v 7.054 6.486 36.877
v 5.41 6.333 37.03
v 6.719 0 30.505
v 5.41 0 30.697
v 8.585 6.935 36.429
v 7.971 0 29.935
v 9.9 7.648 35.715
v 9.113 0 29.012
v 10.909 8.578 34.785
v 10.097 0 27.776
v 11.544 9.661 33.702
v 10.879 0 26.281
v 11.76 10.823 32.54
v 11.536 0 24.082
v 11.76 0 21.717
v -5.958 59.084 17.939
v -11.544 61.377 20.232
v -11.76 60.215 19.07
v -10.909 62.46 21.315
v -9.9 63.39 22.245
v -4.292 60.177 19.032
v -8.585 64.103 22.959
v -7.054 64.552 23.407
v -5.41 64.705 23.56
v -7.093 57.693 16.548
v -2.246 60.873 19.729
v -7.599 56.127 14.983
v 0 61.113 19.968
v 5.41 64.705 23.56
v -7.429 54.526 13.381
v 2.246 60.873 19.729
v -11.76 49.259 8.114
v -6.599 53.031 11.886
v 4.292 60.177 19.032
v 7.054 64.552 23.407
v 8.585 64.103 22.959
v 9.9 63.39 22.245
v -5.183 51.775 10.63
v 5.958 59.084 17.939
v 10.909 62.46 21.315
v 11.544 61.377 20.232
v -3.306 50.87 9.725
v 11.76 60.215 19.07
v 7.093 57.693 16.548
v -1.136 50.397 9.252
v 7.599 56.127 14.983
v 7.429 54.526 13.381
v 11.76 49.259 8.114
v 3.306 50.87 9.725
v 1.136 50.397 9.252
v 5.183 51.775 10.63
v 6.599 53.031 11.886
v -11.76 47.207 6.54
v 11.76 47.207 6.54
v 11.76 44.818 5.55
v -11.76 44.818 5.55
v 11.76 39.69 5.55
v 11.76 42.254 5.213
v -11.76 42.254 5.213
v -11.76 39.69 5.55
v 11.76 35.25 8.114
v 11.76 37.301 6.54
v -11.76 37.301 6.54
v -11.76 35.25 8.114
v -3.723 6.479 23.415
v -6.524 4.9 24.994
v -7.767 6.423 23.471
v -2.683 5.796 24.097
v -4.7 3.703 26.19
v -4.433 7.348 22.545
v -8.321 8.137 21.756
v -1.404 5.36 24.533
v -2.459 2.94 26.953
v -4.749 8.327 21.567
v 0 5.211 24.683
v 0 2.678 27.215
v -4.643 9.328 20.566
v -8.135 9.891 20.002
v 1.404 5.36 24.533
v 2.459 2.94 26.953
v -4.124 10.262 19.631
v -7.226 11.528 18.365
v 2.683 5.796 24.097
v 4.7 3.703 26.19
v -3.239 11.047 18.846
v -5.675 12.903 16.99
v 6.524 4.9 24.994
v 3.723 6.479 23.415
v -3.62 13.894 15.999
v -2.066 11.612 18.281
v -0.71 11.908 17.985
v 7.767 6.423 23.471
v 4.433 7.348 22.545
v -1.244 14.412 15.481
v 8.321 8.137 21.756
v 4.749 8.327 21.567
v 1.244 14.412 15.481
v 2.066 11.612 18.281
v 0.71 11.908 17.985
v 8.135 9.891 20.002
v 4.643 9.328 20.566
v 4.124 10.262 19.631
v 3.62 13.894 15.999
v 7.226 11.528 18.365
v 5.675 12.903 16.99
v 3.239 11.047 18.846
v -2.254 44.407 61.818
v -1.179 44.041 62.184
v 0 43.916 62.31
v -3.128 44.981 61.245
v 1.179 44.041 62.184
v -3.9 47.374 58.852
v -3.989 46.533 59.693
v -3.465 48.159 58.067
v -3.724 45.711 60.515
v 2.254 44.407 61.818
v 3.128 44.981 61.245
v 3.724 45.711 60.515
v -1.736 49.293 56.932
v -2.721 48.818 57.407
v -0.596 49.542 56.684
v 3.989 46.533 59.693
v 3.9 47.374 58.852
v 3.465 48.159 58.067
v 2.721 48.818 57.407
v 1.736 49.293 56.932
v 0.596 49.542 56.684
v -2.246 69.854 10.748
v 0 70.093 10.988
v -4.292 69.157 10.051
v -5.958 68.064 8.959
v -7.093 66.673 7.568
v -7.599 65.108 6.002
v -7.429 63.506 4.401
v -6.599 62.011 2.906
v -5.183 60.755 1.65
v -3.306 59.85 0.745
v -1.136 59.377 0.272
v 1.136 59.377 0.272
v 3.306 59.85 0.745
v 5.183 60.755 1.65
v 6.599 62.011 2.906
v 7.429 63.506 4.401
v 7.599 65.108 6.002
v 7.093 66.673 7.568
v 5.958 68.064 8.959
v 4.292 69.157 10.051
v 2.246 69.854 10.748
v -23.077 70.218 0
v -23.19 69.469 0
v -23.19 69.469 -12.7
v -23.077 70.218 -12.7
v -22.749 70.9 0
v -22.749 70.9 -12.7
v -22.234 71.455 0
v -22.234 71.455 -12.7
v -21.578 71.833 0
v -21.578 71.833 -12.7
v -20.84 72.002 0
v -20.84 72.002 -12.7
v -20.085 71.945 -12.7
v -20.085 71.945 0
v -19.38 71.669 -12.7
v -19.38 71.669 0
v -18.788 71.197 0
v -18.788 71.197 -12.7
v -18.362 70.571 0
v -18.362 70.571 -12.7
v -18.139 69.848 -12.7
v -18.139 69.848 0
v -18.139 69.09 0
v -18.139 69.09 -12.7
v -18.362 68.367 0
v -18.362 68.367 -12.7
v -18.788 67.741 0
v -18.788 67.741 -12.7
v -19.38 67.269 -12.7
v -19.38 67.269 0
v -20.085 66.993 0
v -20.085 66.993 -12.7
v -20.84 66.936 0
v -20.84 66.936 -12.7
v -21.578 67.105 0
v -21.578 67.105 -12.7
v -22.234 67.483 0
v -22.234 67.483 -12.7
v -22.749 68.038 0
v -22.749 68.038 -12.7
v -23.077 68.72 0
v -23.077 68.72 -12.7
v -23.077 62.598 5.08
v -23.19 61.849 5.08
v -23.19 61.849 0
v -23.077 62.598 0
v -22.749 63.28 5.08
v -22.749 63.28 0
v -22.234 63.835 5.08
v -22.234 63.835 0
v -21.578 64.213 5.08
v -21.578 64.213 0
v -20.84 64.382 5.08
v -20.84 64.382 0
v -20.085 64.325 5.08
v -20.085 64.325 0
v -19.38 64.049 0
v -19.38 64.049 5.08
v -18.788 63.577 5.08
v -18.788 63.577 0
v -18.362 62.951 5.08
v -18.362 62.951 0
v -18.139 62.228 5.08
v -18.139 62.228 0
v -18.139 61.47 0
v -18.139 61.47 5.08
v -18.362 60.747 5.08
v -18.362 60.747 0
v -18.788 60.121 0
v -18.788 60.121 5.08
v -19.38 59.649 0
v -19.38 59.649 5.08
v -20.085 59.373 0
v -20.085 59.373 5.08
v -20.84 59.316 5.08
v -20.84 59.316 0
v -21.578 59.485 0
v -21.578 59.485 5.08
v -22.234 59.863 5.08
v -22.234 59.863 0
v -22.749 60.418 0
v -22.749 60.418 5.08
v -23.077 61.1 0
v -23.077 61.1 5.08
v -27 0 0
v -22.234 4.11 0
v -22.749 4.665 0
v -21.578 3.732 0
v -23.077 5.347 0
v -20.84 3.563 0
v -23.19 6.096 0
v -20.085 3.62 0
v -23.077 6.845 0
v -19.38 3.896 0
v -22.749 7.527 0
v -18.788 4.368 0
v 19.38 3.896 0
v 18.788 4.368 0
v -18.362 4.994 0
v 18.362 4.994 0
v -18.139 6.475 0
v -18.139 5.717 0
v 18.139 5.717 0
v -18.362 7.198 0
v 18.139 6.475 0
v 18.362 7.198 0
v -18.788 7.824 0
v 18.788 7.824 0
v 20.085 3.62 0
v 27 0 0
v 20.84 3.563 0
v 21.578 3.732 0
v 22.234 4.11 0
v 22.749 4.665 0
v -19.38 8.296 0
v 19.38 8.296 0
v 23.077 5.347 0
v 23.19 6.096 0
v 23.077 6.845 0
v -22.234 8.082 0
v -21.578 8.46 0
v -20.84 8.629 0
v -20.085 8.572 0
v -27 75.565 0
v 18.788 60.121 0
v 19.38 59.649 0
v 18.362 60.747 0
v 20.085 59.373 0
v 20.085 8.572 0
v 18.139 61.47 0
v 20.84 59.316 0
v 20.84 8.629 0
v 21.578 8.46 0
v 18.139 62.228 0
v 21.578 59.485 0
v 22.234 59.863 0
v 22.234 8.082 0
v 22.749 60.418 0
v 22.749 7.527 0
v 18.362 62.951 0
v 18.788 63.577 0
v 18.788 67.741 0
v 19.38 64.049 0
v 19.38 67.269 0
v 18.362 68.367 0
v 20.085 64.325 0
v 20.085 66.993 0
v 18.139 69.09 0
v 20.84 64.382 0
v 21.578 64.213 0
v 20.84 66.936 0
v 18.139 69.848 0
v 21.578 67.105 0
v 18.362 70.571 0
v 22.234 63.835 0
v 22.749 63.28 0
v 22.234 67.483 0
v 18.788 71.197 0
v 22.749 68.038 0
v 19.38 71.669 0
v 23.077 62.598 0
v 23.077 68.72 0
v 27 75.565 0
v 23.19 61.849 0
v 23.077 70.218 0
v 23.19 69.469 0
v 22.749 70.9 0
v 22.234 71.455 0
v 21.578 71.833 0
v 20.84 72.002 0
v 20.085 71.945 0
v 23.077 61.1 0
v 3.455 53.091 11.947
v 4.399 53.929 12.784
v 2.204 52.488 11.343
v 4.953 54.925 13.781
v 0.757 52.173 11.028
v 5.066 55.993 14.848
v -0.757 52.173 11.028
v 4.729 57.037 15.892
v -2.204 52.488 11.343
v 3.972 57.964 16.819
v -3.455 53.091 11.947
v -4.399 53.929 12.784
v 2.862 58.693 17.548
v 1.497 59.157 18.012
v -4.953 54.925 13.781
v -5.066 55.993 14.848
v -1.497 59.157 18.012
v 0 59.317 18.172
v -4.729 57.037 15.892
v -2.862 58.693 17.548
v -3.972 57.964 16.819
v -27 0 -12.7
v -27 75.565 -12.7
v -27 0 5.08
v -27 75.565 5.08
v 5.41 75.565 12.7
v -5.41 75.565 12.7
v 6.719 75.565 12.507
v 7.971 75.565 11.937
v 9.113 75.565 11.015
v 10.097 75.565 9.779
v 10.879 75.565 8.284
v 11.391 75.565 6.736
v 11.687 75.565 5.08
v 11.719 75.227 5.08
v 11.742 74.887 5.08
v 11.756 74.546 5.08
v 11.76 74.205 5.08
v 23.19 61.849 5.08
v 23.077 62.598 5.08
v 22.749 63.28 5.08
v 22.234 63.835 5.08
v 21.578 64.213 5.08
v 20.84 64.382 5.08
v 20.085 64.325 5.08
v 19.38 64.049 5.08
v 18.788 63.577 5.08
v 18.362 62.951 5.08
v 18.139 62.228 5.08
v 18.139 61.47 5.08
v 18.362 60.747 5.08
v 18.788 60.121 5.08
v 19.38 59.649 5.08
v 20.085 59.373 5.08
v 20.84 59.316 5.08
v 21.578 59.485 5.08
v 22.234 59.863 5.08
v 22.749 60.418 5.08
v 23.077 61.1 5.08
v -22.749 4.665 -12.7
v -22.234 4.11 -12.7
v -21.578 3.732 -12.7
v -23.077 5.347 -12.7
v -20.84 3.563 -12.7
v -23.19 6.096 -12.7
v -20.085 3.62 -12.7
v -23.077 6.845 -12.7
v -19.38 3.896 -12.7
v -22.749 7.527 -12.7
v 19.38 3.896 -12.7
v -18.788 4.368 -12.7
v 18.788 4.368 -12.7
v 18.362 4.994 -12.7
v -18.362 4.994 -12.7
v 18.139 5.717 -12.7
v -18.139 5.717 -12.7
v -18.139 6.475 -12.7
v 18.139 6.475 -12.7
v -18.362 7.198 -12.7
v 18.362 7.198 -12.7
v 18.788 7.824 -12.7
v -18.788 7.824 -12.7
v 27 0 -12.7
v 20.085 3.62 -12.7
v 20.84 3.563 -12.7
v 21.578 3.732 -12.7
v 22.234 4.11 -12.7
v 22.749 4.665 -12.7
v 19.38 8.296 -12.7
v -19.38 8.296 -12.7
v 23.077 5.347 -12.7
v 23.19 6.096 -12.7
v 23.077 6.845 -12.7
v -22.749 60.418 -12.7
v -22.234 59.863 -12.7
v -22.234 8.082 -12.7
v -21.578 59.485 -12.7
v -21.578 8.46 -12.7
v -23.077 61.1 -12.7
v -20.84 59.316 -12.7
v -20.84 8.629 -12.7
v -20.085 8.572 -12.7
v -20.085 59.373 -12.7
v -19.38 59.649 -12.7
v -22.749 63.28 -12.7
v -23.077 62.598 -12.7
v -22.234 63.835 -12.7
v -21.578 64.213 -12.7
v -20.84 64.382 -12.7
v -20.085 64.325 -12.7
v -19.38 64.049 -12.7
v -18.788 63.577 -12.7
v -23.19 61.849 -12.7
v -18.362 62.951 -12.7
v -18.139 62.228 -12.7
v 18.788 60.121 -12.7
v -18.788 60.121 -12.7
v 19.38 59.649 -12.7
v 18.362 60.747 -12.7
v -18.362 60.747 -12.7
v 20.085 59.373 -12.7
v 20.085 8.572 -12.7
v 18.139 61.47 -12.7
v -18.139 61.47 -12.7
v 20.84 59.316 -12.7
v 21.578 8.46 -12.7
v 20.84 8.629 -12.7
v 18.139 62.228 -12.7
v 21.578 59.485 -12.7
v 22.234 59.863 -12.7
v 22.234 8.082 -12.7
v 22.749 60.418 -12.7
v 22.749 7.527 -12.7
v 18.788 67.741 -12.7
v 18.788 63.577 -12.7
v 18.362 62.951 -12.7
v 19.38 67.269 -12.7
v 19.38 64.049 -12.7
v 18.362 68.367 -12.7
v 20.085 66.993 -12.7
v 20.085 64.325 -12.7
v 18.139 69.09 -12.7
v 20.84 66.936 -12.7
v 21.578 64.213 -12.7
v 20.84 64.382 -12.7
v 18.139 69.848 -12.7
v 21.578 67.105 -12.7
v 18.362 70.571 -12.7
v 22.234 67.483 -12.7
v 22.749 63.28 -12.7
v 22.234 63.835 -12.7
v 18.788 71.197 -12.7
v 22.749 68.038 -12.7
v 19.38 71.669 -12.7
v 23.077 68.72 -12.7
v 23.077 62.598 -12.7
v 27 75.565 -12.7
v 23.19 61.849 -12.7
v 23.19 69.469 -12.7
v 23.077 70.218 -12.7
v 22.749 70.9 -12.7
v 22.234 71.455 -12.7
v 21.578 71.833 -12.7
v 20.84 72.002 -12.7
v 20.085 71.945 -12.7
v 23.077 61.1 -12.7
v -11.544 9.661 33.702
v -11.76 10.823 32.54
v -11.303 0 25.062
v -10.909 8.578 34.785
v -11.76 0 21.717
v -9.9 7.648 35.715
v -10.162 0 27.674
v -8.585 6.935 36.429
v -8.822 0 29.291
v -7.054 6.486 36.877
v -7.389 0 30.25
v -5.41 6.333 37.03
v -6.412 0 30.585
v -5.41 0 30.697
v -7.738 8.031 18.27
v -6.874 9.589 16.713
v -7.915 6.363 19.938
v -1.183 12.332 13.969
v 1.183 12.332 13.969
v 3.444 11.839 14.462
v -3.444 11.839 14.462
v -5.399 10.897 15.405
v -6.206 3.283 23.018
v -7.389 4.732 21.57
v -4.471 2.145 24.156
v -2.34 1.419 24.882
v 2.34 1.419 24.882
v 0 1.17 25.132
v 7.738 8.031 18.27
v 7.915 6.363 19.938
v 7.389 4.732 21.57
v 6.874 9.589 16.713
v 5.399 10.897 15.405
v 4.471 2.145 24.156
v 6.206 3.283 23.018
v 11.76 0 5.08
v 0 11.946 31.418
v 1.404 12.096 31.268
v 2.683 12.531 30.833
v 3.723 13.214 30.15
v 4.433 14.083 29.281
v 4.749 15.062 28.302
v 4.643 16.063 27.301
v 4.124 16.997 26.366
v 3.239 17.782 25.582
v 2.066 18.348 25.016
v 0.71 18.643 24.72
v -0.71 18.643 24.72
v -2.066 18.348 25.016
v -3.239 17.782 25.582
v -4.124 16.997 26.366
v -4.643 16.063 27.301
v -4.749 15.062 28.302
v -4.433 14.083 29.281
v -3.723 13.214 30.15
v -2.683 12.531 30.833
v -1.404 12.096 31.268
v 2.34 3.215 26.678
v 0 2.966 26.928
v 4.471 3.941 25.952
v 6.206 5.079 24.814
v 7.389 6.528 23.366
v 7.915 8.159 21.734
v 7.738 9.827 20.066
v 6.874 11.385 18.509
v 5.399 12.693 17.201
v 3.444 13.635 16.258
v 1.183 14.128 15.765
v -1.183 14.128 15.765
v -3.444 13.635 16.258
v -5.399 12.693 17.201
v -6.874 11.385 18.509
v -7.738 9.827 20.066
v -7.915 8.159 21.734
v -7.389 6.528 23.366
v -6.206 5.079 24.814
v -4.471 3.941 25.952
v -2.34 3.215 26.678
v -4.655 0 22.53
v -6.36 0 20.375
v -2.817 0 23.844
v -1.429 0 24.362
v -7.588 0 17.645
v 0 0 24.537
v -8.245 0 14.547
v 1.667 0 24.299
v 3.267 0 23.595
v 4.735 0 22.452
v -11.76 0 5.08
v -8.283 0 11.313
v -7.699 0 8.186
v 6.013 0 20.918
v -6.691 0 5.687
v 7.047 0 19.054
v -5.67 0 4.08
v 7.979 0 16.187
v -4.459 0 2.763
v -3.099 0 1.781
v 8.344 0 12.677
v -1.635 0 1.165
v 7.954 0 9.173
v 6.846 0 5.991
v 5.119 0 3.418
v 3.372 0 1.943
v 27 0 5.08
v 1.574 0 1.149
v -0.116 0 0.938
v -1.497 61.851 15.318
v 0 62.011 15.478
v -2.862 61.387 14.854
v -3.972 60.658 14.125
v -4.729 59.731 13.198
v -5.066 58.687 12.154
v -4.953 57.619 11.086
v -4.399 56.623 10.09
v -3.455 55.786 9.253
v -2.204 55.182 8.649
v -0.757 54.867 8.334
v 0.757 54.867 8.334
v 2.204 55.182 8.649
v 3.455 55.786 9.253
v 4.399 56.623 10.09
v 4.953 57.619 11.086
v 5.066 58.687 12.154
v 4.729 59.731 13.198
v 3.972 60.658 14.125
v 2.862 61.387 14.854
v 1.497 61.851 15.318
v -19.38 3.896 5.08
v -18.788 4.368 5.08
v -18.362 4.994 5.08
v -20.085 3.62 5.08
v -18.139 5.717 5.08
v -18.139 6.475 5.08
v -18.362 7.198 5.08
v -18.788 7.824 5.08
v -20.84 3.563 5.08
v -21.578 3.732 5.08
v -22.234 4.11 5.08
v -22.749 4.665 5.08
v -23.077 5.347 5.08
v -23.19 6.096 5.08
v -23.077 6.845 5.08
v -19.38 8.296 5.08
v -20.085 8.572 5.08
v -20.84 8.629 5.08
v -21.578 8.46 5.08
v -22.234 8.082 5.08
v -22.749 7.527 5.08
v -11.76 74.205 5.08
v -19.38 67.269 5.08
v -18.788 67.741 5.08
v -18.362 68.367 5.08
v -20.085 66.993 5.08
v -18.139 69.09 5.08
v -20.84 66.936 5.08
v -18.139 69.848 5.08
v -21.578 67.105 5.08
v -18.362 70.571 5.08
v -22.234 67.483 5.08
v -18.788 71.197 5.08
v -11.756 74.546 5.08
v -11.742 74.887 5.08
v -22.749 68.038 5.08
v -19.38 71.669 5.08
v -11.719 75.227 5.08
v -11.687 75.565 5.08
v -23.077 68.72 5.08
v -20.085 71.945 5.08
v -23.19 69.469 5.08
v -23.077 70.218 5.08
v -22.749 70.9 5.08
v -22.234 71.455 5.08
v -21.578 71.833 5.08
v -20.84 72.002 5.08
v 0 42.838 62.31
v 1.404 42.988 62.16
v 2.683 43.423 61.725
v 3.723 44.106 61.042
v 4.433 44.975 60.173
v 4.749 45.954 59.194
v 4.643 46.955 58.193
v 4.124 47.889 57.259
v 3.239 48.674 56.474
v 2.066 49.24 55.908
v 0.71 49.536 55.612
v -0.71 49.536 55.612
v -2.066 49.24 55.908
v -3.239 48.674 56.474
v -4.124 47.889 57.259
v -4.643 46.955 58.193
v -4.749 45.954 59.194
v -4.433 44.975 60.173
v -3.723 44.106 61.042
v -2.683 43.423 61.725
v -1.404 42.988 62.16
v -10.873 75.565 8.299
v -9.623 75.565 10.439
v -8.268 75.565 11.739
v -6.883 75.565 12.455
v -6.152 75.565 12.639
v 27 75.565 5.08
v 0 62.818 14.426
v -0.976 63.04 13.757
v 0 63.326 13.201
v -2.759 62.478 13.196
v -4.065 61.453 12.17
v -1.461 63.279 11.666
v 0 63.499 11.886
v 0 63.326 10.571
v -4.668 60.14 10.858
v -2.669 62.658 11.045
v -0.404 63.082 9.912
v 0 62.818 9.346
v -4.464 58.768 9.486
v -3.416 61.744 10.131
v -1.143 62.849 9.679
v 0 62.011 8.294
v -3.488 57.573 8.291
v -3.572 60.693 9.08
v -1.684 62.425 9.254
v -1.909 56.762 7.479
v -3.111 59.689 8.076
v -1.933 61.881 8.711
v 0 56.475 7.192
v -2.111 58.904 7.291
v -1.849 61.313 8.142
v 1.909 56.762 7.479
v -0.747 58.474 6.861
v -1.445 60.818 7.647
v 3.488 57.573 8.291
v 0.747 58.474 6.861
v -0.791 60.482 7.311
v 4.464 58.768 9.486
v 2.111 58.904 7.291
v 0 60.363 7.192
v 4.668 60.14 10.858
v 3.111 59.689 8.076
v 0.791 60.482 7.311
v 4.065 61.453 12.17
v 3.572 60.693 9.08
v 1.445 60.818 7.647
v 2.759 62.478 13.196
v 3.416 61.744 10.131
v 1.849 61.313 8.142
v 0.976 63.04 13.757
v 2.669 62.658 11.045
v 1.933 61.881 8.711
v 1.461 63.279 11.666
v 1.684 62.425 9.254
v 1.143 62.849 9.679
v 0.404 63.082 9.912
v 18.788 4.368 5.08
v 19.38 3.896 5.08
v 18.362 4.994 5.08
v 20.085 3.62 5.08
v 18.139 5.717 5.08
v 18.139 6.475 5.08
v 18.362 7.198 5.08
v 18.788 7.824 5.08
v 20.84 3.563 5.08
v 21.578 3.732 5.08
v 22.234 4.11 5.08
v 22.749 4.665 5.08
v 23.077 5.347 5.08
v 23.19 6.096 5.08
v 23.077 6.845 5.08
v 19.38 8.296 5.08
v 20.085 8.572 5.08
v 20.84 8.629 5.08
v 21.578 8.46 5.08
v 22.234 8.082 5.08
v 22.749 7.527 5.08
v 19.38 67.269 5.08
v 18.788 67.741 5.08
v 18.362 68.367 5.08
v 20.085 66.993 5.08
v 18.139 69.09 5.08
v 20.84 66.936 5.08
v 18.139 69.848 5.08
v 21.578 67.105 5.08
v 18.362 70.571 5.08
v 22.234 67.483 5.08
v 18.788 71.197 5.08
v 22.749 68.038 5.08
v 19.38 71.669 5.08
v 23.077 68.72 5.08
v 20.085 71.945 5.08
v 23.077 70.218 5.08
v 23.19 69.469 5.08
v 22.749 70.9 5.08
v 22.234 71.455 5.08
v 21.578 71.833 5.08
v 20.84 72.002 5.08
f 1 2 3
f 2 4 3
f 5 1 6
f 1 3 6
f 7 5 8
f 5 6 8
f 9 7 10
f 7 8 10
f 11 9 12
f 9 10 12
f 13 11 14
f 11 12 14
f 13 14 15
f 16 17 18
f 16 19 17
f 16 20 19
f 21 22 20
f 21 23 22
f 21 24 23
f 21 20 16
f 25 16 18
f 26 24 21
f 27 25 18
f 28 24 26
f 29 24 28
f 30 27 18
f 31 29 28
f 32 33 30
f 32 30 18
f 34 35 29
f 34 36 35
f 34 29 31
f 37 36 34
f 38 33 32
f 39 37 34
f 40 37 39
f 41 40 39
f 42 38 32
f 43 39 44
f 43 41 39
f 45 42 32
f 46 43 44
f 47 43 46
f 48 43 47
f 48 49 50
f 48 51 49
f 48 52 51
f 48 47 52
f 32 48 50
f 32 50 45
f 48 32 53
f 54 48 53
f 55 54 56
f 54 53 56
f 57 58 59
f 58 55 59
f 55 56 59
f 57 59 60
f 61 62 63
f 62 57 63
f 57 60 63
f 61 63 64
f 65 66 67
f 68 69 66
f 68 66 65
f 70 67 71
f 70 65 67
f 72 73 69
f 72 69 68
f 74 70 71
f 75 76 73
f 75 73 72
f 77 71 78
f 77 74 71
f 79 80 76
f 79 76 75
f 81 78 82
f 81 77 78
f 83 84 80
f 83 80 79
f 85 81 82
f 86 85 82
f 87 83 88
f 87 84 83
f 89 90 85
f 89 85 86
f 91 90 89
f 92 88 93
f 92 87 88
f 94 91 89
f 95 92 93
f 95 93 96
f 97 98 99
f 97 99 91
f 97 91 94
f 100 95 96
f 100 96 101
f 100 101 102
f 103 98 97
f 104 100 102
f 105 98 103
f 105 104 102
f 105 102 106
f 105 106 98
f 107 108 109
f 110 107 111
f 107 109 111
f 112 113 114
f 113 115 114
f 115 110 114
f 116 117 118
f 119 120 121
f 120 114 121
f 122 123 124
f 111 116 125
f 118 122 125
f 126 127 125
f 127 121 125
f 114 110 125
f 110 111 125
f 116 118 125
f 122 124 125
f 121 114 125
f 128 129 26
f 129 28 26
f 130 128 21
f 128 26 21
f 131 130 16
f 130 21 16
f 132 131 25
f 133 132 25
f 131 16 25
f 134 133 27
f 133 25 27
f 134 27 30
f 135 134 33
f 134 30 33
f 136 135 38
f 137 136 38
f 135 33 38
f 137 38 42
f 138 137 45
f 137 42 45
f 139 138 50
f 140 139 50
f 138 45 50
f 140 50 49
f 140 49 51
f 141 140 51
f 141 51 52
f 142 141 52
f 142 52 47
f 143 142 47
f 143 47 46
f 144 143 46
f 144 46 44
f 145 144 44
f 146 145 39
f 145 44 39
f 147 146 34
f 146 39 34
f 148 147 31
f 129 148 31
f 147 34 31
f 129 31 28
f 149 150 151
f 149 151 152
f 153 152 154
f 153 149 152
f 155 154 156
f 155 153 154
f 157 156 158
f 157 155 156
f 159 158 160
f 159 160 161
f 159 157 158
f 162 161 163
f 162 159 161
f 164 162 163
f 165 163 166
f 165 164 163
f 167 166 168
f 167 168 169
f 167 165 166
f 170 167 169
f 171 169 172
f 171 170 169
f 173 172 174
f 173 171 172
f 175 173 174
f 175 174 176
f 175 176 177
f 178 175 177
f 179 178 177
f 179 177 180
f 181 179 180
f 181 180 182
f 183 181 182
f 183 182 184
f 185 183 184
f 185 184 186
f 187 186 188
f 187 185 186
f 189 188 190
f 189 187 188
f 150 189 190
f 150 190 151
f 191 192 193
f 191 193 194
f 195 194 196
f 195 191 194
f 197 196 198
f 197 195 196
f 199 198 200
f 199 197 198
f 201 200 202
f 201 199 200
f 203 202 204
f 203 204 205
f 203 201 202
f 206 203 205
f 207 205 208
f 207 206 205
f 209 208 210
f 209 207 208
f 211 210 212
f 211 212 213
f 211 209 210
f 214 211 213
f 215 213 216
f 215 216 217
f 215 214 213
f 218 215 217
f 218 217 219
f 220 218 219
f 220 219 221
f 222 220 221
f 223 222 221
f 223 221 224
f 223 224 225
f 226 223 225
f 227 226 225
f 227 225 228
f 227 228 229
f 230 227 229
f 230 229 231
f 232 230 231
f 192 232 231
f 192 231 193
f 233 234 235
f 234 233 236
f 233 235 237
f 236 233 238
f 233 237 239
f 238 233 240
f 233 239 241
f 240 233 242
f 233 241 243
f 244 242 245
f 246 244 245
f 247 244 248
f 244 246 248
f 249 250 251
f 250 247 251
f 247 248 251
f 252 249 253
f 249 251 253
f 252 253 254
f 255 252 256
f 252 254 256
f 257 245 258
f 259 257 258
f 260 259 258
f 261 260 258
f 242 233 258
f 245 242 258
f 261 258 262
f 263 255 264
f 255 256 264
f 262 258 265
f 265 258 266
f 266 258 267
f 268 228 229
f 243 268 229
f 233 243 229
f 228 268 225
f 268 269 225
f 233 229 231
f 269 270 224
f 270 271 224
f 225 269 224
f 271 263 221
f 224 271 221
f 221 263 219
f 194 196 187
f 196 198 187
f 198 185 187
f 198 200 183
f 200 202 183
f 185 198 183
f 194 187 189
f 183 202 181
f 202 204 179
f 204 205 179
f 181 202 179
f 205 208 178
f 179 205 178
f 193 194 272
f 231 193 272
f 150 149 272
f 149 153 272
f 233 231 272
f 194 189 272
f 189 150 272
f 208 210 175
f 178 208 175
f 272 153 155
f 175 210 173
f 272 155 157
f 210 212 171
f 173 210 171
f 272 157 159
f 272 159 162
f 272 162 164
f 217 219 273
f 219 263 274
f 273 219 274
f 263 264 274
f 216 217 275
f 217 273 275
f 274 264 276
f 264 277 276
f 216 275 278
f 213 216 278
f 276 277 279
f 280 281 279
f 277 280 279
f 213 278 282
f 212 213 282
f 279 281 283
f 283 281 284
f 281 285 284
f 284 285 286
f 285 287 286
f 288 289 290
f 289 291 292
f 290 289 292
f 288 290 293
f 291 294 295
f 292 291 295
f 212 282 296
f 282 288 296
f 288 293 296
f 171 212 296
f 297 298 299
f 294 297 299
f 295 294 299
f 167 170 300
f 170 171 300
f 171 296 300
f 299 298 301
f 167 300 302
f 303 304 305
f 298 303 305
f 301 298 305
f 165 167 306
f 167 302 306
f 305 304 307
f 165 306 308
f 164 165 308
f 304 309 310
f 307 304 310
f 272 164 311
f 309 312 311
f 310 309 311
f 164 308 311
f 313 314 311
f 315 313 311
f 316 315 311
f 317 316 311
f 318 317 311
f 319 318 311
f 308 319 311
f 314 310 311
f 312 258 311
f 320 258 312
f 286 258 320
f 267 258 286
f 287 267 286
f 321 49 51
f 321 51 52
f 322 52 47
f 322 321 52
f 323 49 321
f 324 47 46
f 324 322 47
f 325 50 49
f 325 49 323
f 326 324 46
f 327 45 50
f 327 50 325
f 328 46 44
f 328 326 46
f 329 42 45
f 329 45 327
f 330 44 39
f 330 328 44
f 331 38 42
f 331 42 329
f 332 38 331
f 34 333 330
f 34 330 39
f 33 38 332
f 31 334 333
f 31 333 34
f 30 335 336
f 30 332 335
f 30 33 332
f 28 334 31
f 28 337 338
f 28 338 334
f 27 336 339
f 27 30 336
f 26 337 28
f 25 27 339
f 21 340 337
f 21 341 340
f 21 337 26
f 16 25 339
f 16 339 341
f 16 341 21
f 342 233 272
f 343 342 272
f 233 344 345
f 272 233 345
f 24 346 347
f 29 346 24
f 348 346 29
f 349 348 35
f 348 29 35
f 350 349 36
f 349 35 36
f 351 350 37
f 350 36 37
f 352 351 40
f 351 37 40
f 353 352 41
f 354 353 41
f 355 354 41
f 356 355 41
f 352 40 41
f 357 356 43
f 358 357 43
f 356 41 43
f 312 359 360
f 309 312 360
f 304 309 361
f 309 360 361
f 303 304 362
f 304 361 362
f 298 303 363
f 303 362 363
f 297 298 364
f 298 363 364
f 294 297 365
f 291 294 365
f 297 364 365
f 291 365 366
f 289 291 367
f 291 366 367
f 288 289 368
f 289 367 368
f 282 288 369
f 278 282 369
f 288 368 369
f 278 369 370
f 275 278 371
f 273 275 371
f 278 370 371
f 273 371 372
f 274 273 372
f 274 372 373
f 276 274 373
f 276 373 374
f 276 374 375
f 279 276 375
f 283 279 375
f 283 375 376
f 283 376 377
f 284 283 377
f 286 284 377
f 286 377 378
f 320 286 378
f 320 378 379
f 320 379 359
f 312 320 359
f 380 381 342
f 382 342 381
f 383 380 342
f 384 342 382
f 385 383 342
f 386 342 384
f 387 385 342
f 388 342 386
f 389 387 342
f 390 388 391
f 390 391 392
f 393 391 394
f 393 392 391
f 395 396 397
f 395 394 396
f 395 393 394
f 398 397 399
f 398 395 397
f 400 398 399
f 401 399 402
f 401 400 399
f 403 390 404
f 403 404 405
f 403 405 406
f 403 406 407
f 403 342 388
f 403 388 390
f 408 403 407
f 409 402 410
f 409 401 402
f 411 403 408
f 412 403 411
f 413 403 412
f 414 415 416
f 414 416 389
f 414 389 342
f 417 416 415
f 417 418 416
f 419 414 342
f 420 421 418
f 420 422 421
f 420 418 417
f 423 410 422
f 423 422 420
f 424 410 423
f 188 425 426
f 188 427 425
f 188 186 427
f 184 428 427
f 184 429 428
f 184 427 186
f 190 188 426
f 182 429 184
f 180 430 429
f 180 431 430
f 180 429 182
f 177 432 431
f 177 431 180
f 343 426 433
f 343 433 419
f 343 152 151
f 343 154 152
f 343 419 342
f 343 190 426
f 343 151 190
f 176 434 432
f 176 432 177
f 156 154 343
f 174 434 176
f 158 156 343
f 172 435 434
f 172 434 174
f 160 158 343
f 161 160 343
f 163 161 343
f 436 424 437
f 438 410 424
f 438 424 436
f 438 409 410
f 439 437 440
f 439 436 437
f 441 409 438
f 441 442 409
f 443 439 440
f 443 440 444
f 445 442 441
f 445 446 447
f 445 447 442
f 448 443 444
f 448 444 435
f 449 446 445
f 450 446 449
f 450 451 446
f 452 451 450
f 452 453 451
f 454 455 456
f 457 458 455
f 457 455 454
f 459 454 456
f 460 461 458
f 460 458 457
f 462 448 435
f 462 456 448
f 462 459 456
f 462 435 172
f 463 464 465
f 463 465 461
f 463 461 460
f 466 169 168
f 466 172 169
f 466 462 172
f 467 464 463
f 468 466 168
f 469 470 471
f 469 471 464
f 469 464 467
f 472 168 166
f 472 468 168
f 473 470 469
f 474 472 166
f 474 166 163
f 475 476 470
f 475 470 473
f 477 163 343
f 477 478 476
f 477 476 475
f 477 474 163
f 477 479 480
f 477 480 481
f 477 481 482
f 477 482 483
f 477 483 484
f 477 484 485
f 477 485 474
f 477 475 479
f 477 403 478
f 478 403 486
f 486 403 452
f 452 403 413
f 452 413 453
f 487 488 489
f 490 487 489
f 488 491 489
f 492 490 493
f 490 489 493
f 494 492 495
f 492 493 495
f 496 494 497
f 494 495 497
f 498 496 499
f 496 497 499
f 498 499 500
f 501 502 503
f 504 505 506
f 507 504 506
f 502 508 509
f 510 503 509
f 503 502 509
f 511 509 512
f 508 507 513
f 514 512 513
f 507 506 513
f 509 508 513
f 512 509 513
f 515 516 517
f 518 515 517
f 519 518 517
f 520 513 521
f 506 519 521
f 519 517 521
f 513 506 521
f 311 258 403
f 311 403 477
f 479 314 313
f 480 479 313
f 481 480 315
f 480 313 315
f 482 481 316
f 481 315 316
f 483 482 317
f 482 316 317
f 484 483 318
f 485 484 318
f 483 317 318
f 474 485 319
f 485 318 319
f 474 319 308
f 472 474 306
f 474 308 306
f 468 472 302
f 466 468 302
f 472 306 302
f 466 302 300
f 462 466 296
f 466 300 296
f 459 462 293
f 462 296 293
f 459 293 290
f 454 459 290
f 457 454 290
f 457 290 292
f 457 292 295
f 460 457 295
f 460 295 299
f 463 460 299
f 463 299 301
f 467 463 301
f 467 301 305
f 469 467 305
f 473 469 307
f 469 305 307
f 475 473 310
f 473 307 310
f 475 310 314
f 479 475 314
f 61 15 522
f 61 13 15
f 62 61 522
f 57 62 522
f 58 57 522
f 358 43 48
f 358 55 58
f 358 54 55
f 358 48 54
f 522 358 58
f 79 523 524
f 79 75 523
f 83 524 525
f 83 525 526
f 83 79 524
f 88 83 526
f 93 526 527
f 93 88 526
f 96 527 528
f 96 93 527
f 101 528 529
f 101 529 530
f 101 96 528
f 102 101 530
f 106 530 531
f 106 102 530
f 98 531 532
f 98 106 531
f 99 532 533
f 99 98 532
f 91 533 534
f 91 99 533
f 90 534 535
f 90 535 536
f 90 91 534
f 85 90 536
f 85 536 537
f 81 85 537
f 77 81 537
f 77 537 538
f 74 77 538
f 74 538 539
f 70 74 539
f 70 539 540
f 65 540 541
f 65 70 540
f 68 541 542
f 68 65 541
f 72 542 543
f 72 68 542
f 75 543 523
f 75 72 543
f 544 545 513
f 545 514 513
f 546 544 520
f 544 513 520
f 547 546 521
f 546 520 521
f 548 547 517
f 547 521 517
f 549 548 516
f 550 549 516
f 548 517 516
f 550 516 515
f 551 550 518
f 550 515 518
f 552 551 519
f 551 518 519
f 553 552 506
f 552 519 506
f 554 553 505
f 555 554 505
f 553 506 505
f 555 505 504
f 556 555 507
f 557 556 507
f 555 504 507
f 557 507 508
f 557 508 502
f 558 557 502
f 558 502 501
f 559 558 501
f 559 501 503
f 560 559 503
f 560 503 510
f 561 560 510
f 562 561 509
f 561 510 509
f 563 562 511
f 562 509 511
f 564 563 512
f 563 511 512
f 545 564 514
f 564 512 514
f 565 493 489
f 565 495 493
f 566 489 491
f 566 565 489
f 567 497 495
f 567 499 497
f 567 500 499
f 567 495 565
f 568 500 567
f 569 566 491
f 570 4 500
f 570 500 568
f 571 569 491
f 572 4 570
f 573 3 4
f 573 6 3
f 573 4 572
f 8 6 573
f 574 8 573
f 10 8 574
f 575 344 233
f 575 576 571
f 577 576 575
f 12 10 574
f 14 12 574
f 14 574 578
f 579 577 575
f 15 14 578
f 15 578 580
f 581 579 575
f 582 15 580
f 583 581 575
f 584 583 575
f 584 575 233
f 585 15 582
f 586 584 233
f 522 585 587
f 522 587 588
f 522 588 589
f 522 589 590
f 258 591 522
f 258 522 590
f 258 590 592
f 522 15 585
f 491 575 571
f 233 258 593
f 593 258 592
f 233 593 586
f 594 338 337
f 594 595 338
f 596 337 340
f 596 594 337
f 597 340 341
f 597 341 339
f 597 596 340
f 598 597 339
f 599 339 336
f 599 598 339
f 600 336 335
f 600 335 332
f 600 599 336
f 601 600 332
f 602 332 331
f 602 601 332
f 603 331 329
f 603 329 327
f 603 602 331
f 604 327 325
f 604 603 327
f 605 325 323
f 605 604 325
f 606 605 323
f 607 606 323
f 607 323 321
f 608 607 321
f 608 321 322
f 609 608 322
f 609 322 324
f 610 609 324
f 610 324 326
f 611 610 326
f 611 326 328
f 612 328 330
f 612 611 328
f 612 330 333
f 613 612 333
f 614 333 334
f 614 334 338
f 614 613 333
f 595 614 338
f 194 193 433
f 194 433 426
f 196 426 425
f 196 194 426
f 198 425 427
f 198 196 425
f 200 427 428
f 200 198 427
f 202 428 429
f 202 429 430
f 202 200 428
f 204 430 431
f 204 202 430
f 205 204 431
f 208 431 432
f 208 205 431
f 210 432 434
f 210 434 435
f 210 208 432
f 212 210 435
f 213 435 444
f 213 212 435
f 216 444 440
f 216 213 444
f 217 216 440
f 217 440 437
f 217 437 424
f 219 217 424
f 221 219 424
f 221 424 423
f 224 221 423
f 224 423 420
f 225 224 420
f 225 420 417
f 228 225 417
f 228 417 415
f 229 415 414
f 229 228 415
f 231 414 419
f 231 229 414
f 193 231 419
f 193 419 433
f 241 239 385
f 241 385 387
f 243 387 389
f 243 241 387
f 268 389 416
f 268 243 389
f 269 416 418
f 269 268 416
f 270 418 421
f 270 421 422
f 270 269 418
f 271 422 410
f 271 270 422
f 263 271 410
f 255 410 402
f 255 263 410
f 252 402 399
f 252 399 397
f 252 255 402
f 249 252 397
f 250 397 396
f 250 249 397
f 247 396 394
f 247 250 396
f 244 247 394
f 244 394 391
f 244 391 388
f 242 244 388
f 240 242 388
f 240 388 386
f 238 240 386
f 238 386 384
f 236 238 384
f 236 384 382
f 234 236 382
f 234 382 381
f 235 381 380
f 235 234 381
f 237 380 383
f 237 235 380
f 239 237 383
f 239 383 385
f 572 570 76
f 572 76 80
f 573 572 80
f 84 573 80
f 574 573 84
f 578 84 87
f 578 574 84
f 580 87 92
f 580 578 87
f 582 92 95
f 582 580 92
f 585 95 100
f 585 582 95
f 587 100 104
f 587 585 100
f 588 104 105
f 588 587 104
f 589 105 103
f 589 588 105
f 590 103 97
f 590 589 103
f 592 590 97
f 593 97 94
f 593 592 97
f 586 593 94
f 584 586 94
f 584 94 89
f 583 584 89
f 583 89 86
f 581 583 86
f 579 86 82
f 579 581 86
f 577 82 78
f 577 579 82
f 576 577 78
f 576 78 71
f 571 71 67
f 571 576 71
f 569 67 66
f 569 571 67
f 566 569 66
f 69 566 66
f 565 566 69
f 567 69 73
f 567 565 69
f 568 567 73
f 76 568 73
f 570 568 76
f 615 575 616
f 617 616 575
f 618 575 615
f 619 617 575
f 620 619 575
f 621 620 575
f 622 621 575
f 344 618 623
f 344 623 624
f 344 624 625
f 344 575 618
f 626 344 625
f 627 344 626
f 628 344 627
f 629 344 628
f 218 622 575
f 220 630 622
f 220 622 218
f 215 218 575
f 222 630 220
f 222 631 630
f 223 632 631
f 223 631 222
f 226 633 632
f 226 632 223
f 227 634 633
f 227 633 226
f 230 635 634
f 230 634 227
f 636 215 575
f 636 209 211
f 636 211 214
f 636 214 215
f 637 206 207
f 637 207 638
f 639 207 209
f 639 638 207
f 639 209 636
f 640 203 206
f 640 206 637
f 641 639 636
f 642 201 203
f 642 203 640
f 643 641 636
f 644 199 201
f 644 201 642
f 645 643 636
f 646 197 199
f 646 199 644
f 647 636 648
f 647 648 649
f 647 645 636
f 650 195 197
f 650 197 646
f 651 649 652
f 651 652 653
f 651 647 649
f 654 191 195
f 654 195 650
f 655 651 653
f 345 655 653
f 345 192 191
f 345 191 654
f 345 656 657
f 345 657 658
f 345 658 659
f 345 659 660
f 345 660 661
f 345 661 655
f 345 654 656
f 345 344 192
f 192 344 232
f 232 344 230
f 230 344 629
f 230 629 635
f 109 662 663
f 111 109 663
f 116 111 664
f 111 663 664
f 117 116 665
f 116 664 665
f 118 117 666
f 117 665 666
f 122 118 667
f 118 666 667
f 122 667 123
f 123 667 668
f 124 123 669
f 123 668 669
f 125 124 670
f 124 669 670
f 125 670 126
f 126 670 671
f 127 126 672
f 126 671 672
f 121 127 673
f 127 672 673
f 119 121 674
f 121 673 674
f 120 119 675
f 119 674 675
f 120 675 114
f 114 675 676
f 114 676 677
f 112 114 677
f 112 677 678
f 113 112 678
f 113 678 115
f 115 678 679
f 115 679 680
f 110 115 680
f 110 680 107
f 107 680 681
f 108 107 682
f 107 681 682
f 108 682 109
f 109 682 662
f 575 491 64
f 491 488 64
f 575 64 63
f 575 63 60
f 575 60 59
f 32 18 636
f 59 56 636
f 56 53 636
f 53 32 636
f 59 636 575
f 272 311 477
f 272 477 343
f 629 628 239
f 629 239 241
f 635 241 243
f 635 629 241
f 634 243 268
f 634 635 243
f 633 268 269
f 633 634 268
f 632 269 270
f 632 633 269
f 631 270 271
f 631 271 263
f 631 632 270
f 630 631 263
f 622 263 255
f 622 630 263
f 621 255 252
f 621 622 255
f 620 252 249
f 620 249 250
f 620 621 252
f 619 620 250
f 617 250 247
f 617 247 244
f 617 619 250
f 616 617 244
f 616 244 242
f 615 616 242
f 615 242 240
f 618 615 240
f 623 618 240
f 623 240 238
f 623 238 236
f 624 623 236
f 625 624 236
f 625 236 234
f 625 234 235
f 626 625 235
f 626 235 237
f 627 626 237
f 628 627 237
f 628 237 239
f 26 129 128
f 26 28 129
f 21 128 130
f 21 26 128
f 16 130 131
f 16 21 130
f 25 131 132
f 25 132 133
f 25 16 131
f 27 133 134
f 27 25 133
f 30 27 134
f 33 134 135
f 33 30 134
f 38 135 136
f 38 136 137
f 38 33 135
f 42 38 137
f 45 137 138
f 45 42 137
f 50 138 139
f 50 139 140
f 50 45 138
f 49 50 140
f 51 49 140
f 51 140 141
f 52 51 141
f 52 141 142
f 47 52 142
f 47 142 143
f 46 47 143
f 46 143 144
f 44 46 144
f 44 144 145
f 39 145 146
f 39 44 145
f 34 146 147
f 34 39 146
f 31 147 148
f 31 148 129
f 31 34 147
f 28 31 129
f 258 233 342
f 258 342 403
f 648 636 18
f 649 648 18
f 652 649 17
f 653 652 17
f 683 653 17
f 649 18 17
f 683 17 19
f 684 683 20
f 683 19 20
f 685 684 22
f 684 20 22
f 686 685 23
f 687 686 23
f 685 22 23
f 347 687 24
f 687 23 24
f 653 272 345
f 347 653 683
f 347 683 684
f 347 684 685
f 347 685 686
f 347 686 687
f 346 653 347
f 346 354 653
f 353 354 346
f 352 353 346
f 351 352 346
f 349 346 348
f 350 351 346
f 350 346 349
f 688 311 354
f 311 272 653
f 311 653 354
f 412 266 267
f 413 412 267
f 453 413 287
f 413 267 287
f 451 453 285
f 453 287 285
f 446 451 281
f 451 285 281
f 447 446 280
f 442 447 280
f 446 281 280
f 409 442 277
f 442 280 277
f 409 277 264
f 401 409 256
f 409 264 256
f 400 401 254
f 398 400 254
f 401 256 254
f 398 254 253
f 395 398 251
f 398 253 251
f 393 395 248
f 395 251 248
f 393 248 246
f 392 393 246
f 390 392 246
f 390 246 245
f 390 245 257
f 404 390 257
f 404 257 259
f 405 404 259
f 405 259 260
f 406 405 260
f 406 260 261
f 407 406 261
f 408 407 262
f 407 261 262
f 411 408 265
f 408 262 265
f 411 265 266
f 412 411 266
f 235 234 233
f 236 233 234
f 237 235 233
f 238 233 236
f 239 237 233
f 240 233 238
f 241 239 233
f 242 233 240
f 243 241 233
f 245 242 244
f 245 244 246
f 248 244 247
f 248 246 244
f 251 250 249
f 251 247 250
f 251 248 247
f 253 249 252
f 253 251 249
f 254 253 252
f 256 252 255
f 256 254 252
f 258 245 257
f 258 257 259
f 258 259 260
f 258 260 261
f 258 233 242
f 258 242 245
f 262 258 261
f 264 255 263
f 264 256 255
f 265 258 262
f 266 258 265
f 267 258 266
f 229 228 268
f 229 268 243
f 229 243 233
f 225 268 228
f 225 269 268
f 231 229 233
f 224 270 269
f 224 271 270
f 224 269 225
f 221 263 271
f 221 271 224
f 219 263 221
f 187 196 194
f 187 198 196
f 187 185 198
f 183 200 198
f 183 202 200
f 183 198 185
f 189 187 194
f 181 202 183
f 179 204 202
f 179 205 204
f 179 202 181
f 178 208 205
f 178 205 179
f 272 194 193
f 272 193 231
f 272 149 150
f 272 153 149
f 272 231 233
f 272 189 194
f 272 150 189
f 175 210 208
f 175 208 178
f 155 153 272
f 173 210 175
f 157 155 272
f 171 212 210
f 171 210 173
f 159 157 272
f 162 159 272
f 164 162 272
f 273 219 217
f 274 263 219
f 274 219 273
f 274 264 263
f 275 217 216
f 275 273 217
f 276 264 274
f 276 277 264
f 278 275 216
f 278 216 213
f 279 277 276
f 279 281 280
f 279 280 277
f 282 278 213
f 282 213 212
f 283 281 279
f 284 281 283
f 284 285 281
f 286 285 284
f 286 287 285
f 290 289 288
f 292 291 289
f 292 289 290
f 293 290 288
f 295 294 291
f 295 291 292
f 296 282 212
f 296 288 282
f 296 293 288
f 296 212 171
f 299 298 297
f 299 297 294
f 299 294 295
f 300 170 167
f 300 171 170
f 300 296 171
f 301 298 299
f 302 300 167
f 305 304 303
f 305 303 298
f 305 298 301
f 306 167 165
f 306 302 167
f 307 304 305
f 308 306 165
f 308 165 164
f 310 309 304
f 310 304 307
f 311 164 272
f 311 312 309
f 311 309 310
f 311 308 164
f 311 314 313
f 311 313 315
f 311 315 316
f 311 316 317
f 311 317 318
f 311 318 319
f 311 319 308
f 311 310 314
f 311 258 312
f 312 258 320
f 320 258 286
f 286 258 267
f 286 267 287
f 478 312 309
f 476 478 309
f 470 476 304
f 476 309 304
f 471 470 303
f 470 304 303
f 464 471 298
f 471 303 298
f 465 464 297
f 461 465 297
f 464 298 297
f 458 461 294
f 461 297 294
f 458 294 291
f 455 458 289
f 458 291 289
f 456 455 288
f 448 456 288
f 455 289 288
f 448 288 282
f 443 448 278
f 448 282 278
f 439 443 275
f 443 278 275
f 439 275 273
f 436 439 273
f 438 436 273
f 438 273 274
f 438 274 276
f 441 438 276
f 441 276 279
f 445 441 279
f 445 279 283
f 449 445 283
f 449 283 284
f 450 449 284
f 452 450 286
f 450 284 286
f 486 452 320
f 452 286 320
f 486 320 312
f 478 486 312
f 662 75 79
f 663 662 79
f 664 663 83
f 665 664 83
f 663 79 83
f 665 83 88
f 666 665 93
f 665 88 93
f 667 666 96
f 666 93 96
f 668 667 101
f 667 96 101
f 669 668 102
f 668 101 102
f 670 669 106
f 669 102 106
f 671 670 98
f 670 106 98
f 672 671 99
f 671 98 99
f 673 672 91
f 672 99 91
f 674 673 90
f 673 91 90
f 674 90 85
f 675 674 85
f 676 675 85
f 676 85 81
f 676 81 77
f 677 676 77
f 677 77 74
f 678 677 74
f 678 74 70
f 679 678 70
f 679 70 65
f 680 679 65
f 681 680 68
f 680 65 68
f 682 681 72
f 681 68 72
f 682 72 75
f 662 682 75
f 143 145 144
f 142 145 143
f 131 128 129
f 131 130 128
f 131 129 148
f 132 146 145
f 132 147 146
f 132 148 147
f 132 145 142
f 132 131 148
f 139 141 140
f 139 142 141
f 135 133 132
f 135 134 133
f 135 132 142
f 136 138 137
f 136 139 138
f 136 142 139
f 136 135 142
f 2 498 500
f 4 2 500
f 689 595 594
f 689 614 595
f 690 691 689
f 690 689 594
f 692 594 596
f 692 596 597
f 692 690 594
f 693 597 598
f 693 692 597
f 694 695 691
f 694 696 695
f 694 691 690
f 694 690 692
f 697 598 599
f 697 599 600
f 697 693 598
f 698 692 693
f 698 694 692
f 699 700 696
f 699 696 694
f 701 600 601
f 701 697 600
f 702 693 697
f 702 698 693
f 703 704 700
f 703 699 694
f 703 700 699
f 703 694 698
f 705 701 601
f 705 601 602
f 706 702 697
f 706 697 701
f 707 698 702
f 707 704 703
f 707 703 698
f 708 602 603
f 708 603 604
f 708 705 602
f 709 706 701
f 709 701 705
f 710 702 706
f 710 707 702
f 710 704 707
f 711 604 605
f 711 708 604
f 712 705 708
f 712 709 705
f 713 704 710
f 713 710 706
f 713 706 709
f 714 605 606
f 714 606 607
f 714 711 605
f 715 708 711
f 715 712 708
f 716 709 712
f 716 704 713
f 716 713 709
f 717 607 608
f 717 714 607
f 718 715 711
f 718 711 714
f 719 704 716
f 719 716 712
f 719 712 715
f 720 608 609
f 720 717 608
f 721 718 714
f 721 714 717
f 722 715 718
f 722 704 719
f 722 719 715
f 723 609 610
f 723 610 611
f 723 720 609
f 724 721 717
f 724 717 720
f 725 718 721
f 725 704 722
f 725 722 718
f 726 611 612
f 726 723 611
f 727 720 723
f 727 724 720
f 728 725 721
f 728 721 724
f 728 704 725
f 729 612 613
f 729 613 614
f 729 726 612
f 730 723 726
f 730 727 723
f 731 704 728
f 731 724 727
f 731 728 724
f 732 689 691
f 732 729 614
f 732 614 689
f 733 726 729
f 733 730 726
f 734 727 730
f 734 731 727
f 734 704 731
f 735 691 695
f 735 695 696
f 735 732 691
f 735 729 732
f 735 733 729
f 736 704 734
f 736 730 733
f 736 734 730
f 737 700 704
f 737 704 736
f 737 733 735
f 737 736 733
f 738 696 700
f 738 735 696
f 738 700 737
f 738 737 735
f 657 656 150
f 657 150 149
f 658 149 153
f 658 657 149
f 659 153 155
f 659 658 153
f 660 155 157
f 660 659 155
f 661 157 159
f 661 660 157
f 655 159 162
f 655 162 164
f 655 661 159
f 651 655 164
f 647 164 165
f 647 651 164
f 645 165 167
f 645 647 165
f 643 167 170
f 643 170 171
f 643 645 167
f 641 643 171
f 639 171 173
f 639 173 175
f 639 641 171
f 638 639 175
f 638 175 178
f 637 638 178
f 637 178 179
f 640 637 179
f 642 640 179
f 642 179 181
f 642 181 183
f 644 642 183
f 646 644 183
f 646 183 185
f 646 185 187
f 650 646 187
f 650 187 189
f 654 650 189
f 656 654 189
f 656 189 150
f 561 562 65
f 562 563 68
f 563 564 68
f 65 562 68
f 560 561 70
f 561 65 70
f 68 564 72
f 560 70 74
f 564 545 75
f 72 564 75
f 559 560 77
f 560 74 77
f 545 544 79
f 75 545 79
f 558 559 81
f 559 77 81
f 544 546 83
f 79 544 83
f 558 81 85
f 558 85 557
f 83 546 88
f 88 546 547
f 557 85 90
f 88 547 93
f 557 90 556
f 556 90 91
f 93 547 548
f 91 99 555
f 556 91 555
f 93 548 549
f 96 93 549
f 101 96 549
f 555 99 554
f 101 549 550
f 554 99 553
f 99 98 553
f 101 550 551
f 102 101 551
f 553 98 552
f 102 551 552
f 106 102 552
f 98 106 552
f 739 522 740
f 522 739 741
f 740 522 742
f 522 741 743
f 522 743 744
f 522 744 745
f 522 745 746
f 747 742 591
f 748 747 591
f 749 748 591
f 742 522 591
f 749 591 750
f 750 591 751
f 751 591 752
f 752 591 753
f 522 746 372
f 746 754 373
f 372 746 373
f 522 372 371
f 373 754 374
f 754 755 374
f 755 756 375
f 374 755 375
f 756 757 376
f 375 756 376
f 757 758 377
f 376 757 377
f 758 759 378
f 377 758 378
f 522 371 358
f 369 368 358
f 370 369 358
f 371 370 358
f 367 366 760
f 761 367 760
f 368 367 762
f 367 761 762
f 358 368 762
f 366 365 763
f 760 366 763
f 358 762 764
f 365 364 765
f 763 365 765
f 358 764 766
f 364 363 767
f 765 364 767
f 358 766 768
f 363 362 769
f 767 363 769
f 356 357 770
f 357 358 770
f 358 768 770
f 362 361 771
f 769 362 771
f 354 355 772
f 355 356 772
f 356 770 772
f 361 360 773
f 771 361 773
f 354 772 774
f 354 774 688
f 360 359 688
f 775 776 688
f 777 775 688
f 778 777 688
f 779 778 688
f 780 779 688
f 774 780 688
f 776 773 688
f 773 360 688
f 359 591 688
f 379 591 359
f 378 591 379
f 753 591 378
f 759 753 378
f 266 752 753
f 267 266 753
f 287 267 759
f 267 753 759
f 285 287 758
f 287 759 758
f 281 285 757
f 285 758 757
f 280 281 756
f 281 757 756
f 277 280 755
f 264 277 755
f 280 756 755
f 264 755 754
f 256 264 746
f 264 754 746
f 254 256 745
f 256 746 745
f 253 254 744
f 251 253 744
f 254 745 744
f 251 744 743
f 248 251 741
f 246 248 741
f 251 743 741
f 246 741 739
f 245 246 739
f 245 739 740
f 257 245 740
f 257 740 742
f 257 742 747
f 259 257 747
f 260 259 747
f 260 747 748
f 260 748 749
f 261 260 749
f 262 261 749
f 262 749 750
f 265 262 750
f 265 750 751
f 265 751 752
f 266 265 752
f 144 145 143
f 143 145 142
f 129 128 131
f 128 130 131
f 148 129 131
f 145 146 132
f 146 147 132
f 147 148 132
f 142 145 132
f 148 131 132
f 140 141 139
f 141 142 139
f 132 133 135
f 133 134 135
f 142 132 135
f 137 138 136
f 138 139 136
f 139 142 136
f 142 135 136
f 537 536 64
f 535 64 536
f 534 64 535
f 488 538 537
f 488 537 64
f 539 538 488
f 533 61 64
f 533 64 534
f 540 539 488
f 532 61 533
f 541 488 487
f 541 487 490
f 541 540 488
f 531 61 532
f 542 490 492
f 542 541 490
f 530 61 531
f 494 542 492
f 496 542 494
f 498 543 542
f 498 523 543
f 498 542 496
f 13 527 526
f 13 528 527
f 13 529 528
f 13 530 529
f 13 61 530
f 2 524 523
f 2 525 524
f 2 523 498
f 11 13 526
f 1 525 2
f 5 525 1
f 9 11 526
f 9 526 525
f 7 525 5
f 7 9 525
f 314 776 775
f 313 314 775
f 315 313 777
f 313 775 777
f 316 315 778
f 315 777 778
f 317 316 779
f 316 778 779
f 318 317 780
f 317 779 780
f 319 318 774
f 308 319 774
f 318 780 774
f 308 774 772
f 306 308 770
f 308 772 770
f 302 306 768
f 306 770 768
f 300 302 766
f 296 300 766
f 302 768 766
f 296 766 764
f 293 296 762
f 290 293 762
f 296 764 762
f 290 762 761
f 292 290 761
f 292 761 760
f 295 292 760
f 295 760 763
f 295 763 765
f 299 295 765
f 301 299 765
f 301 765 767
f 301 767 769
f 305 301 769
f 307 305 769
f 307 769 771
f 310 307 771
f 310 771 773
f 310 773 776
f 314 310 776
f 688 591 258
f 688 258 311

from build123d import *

# Parameters (mm, degrees)
F1_DEPTH  = 27.0002
F2_R      = 9.906
F3_W      = 75.565
F3_H      = 31.9504877579
F4_DEPTH  = 15.24
F5_R      = 2.54
F6_DEPTH  = 5.081
F8_R      = 6.35
F13_SIZE  = 0.762
F16_DEPTH = 12.7


with BuildPart() as f1:
    # F0 (on Right) → F1 (new body)
    with BuildSketch(Plane.YZ):
        Polygon((0, 30.6972561211), (0, 0), (75.565, 0), (75.565, 12.7), (64.7048964237, 23.5601035763), (42.2542561211, 1.1094632736), (6.3332316368, 37.0304877579), align=None)
    extrude(amount=F1_DEPTH)

    # F2
    f2_edges = [f1.edges().sort_by_distance(p)[0] for p in [
        (13.5001, 42.254256, 1.109463),
    ]]
    fillet(f2_edges, radius=F2_R)

    # F3 (on face) → F4 (cut)
    with BuildSketch(Plane.YZ.offset(27.0002)):
        with Locations((37.7825, 21.0552438789)):
            Rectangle(F3_W, F3_H)
    extrude(amount=-F4_DEPTH, mode=Mode.SUBTRACT)

    # F5 (on face) → F6 (cut, through all)
    with BuildSketch(Plane.XY.offset(5.08)):
        with Locations((20.6502, 69.469)):
            Circle(F5_R)
        with Locations((20.6502, 61.849)):
            Circle(F5_R)
        with Locations((20.6502, 6.096)):
            Circle(F5_R)
    extrude(amount=-F6_DEPTH, mode=Mode.SUBTRACT)

    # F7: F1 across face


with BuildPart() as f1_1:
    add(f1.part)
    add(f1.part.mirror(Plane(origin=(0, 31.4297936493, 11.6265989231), x_dir=(0, 1, 0), z_dir=(-1, 0, 0))))

    # F8
    f8_edges = [f1_1.edges().sort_by_distance(p)[0] for p in [
        (-11.7602, 70.134948, 18.130052),
        (-11.7602, 3.166616, 33.863872),
        (11.7602, 3.166616, 33.863872),
        (11.7602, 70.134948, 18.130052),
    ]]
    fillet(f8_edges, radius=F8_R)

    # F9 (on Right) → F10 (revolve, cut)
    with BuildSketch(Plane.YZ):
        Polygon((-6.3683719395, 6.3683719395), (15.3134877579, 28.0502316368), (11.9458917125, 31.4178276822), (5.2106996217, 24.6826355914), (2.6782673955, 27.2150678175), (-12.268400211, 12.268400211), align=None)
    revolve(axis=Axis((0, 22.0486798487, 34.7854237276), (0, 0.7071067812, 0.7071067812)), mode=Mode.SUBTRACT)

    # F14 (on Right) → F15 (revolve, cut)
    with BuildSketch(Plane.YZ):
        Polygon((61.1127939753, 19.9680011278), (55.7246403027, 14.5798474552), (64.7048964237, 5.5995913341), (70.0930500964, 10.9877450068), align=None)
    revolve(axis=Axis((0, 60.2147683632, 10.0897193947), (0, -0.7071067812, 0.7071067812)), mode=Mode.SUBTRACT)


with BuildPart() as f12:
    # F11 (on Right) → F12 (revolve)
    with BuildSketch(Plane.YZ):
        Polygon((11.9458917125, 31.4178276822), (5.2106996217, 24.6826355914), (2.9656355914, 26.9276996217), (1.1695843672, 25.1316483974), (6.7822444428, 19.5189883218), (46.7443841816, 59.4811280605), (43.3767881362, 62.8487241059), align=None)
    revolve(axis=Axis((0, 26.7633143122, 39.5000581912), (0, 0.7071067812, 0.7071067812)))

    # F13
    f13_edges = [f12.edges().sort_by_distance(p)[0] for p in [
        (0, 50.11198, 56.113532),
    ]]
    chamfer(f13_edges, length=F13_SIZE)


with BuildPart() as f16:
    # F16 (new): a face of the model
    f16_faces = [f1_1.part.faces().sort_by_distance(p)[0] for p in [
        (0, 37.5360763609, 0),
    ]]
    extrude(f16_faces, amount=F16_DEPTH)


with BuildPart() as f18:
    # F17 (on Right) → F18 (revolve)
    with BuildSketch(Plane.YZ):
        with BuildLine():
            Line((59.3167427511, 18.1719499036), (62.0108195874, 15.4778730673))
            ThreePointArc((62.0108195874, 15.4778730673), (63.498717139, 11.8857706189), (62.0108195874, 8.2936681704))
            Line((62.0108195874, 8.2936681704), (64.7048964237, 5.5995913341))
            Line((64.7048964237, 5.5995913341), (70.0930500964, 10.9877450068))
            Line((70.0930500964, 10.9877450068), (61.1127939753, 19.9680011278))
            Line((61.1127939753, 19.9680011278), (59.3167427511, 18.1719499036))
        make_face()
    revolve(axis=Axis((0, 60.2147683632, 10.0897193947), (0, -0.7071067812, 0.7071067812)))


solid = Compound([f1_1.part, f12.part, f16.part, f18.part])
